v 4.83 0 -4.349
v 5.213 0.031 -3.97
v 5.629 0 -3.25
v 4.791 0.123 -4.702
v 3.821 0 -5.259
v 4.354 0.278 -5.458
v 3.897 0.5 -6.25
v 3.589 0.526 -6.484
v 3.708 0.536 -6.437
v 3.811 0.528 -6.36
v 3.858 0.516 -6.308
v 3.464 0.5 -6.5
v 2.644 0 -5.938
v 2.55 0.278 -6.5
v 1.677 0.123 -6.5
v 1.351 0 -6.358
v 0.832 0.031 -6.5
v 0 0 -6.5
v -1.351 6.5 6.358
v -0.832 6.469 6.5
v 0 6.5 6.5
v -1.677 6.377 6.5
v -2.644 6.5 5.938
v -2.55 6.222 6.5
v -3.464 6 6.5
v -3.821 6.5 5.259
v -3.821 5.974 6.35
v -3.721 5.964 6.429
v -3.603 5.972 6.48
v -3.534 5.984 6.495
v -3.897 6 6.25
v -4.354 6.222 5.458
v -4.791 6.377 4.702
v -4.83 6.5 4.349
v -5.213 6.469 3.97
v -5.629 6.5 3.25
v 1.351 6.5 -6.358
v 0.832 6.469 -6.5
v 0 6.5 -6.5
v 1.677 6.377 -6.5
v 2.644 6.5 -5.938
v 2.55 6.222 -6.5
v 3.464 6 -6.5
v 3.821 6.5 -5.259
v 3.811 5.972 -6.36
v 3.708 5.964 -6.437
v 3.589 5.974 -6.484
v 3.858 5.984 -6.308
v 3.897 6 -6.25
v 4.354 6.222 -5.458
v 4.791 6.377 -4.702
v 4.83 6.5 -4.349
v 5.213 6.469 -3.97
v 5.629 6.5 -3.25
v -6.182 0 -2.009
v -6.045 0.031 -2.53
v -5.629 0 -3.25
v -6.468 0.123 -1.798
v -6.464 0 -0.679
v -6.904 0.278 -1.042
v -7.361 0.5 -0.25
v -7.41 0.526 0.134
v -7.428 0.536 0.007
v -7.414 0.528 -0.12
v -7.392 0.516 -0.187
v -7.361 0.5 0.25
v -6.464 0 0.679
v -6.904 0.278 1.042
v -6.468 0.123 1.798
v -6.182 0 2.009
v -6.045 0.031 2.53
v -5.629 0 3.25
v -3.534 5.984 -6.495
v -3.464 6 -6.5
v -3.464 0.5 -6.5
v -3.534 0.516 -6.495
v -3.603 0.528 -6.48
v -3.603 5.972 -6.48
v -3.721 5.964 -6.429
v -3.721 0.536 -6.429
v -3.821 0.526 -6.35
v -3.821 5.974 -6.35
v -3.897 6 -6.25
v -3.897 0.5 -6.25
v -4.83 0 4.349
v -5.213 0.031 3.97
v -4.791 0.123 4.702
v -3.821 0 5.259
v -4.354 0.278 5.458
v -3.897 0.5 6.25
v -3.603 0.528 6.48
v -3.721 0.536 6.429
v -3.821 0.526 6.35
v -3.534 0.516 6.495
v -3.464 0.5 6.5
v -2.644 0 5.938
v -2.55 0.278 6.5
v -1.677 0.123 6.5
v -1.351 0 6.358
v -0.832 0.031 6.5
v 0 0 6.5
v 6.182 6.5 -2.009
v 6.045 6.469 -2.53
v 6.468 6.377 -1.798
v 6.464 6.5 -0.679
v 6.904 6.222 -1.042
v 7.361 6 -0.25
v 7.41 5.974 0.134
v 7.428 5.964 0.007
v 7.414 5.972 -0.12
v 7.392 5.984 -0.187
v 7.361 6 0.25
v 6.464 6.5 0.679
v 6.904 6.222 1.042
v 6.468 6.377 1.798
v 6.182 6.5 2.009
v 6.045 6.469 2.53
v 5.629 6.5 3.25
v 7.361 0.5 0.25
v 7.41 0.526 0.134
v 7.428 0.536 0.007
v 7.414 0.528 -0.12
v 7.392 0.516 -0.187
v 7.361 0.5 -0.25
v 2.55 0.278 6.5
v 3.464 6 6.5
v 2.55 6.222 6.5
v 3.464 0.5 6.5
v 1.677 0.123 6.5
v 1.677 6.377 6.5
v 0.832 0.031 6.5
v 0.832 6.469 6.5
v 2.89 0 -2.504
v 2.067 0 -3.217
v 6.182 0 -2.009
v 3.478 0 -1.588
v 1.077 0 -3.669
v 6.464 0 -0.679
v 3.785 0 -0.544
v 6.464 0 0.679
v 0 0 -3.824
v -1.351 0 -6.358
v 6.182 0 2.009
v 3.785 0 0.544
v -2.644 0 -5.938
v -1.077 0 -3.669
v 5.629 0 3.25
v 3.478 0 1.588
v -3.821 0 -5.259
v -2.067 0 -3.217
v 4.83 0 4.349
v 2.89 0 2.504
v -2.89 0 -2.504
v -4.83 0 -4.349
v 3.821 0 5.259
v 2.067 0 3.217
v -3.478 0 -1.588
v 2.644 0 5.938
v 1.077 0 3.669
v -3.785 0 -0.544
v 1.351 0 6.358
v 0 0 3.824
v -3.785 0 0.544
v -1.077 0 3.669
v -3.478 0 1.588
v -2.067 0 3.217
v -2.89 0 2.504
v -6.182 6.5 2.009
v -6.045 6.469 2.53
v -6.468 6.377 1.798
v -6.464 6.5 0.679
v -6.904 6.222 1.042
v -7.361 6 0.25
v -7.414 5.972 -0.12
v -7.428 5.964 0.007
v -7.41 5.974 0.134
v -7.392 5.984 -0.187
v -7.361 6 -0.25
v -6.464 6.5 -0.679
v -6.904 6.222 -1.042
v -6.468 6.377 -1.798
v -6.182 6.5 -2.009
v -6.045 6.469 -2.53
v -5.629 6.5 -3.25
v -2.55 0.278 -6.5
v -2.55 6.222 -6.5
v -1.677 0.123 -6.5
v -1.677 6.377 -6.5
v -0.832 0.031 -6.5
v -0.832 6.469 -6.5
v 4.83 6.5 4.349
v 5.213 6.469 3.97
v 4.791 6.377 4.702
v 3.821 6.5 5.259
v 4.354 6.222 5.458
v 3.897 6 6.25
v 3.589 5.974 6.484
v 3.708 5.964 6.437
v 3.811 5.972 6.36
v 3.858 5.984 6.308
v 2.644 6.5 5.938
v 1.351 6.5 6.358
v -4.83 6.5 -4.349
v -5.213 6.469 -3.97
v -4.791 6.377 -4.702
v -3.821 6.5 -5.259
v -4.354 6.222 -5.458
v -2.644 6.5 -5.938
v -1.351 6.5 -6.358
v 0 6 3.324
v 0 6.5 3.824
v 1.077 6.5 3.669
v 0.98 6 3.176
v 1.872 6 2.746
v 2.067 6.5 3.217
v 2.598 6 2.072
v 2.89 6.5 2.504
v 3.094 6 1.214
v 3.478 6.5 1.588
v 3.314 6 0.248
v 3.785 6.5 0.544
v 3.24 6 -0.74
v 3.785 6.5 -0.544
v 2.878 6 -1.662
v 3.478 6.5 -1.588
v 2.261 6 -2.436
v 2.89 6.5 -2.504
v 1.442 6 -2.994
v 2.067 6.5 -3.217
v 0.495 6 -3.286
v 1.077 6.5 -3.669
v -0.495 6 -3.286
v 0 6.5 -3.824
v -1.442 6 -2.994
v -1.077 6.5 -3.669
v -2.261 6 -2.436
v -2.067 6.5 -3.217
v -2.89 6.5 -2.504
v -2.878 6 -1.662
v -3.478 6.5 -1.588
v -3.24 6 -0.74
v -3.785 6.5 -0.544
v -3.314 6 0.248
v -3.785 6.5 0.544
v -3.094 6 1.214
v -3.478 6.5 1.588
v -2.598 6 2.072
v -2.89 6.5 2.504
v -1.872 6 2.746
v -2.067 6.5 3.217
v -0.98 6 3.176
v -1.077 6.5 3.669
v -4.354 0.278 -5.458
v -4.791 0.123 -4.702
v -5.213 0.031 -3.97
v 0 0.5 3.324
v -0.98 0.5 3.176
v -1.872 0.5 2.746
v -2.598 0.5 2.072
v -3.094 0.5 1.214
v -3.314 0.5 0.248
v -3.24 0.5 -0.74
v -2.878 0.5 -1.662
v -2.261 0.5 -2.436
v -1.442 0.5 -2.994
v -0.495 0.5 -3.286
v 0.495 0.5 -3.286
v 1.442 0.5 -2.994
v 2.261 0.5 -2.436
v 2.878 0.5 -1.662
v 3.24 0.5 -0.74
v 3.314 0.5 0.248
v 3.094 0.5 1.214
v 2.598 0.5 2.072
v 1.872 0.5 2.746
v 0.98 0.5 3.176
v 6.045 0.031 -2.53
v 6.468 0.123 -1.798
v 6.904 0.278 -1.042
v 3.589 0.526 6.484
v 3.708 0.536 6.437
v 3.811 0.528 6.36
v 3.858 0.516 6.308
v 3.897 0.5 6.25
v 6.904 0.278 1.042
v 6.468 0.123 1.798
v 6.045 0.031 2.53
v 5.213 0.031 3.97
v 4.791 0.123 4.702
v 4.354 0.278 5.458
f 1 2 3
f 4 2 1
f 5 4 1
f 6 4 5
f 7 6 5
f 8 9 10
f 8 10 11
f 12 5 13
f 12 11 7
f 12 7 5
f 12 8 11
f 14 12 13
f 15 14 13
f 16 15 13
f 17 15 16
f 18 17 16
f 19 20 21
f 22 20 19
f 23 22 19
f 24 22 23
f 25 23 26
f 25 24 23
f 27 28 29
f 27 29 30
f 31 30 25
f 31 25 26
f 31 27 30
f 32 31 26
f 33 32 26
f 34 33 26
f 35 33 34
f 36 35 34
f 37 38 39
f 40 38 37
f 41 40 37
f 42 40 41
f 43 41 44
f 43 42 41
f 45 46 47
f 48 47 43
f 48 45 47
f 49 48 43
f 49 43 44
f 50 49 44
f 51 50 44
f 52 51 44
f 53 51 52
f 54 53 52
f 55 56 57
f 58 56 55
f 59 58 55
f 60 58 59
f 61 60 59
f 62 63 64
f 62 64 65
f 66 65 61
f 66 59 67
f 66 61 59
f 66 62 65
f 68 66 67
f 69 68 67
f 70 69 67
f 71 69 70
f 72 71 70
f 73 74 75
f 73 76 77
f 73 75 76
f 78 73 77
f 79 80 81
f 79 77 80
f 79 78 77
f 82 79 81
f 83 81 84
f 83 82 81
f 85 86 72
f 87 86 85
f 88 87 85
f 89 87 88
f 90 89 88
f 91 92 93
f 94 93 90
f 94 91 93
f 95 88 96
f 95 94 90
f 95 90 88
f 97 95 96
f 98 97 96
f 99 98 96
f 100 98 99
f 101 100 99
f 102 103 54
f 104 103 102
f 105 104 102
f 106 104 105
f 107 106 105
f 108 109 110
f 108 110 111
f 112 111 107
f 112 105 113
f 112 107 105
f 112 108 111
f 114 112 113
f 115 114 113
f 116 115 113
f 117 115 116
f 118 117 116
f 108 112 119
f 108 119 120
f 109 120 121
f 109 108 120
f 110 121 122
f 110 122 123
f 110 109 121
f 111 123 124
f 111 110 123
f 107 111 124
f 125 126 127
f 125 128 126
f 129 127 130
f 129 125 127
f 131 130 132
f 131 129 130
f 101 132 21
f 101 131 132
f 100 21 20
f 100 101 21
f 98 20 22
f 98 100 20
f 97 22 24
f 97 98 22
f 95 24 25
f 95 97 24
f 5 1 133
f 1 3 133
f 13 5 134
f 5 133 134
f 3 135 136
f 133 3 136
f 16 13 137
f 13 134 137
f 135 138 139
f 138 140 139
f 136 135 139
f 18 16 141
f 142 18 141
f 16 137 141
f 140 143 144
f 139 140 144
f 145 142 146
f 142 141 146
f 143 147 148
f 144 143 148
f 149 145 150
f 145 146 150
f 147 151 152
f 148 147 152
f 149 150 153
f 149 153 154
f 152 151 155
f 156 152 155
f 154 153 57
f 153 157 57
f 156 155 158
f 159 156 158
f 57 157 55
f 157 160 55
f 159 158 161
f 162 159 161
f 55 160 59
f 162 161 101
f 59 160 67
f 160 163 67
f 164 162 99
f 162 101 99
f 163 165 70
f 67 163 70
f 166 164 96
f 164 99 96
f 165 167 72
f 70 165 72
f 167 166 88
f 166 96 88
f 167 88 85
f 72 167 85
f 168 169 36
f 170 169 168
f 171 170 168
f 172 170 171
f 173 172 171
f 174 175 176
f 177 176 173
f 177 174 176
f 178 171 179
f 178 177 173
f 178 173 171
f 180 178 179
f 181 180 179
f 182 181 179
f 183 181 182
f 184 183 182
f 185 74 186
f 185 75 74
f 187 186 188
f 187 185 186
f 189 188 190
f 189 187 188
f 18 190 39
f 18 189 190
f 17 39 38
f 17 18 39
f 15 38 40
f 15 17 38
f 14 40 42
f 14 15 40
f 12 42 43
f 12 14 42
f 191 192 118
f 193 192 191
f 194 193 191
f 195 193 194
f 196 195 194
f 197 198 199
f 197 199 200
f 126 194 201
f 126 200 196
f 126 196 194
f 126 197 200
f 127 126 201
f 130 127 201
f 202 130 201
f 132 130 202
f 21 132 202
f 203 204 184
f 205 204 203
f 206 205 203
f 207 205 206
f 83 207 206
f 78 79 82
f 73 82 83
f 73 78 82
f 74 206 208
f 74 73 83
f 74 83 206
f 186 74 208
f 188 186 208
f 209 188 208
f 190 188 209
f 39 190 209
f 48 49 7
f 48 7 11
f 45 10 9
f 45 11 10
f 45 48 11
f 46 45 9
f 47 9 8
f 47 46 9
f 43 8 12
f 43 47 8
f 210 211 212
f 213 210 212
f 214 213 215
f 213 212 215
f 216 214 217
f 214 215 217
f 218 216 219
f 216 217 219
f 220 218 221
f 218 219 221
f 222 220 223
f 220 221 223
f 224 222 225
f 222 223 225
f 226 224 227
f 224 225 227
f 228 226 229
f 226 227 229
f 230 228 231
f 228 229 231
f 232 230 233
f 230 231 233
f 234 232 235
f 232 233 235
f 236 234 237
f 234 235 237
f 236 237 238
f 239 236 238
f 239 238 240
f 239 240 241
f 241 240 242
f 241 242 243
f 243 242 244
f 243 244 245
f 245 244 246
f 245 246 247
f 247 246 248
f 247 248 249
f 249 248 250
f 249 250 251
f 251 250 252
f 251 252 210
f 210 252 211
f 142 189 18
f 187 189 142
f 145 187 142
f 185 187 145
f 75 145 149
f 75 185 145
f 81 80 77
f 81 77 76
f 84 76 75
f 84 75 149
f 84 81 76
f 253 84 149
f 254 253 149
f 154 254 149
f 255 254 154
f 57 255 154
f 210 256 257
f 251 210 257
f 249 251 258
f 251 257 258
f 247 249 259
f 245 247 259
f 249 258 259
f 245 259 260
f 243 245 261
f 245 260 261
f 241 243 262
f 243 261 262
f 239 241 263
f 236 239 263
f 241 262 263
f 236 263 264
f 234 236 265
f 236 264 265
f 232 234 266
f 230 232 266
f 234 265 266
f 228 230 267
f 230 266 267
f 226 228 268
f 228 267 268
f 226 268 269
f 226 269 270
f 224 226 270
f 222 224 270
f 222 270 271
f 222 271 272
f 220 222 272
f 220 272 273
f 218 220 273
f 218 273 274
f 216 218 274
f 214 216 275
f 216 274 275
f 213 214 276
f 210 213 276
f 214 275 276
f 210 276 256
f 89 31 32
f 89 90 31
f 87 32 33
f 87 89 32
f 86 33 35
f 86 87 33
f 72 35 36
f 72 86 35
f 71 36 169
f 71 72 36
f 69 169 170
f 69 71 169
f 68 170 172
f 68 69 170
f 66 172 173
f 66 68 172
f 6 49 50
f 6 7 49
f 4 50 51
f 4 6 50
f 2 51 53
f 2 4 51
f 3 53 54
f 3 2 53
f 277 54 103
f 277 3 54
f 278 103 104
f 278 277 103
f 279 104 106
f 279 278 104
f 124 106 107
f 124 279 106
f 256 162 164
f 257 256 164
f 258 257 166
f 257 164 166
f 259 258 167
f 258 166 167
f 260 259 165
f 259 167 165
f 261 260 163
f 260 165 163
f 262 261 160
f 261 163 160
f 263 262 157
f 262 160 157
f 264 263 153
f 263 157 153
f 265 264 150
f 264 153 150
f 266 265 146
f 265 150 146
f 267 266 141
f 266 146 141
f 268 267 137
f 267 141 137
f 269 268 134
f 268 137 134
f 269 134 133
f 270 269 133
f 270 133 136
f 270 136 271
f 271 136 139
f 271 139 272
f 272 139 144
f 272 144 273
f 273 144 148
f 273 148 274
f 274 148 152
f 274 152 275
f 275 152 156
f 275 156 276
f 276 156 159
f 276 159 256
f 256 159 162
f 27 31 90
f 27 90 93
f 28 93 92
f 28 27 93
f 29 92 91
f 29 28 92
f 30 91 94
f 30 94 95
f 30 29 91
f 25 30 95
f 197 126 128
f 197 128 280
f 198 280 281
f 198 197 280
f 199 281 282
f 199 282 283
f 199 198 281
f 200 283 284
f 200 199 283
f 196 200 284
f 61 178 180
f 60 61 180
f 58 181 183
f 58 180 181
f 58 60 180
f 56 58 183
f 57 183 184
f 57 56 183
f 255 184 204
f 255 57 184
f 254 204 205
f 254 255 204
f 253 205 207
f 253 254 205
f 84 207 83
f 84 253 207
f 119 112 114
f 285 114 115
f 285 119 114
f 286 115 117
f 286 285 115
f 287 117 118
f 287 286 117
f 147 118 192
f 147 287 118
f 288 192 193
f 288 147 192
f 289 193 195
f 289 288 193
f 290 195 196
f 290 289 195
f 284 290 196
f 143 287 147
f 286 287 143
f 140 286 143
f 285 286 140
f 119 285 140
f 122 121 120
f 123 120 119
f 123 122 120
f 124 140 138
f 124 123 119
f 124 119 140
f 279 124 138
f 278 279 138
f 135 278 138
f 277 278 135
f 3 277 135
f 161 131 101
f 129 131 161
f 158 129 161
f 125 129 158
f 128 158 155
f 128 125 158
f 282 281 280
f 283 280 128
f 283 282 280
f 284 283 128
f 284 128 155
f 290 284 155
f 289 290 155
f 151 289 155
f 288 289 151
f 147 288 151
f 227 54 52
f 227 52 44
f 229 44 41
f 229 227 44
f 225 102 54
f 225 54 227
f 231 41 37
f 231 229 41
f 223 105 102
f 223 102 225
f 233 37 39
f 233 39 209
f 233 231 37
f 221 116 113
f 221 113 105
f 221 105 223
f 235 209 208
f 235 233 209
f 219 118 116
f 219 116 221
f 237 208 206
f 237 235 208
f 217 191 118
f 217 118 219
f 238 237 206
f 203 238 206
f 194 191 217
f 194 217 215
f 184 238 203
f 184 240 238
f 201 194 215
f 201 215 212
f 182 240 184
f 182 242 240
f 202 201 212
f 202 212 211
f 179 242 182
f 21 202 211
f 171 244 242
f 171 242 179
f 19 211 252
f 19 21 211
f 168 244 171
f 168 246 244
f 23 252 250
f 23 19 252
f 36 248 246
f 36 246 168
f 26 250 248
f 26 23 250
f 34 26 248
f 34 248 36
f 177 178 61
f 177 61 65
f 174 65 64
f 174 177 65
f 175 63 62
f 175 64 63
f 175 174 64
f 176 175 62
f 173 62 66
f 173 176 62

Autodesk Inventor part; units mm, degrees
ref_plane "YZ Plane" through (0, 0, 0) normal (1, 0, 0) x (0, 1, 0)
ref_plane "XZ Plane" through (0, 0, 0) normal (0, 1, 0) x (-1, 0, 0)
ref_plane "XY Plane" through (0, 0, 0) normal (0, 0, 1) x (1, 0, 0)
sketch "Sketch1" plane through (0, 0, 0) normal (0, 1, 0) x (-1, 0, 0)
  line L0 (3.7528, 6.5) -> (7.5056, 0)
  line L1 (7.5056, 0) -> (3.7528, -6.5)
  line L2 (3.7528, -6.5) -> (-3.7528, -6.5)
  line L3 (-3.7528, -6.5) -> (-7.5056, 0)
  line L4 (-7.5056, 0) -> (-3.7528, 6.5)
  line L5 (-3.7528, 6.5) -> (3.7528, 6.5)
  point P0 (0, 0)
  point P1 (0, 0)
  dimension "d0" = 6.5
extrude "Extrusion1" add sketch "Sketch1" along normal blind 6.5
sketch "Sketch2" plane through (0, 6.5, 0) normal (0, 1, 0) x (1, 0, 0)
  point P0 (0, 0)
hole "Hole1" at (0, 6.5, 0) direction (0, -1, 0) diameter 6.647 depth 8 tip angle 118 thread size "M8x1.25" class "6H" standard "ISO Metric profile"
sketch "Sketch3" plane through (0, 6.5, 0) normal (0, 1, 0) x (1, 0, 0)
  circle A0 centre (0, 0) radius 3.3235 projected
  circle A1 centre (0, 0) radius 6.5
  circle A2 centre (0, 0) radius 29.8584
extrude "Extrusion2" cut sketch "Sketch3" against normal blind 1 draft -60 contours A2
sketch "Sketch4" plane through (0, 0, 0) normal (0, -1, 0) x (1, 0, 0)
  circle A0 centre (0, 0) radius 3.3235 projected
  circle A1 centre (0, 0) radius 6.5
  circle A2 centre (0, 0) radius 18
extrude "Extrusion3" cut sketch "Sketch4" against normal blind 1 draft -60 contours A2
fillet "Fillet1" radius 0.5 6 edges at (-7.5056, 3.25, 0) (-3.7528, 3.25, 6.5) (3.7528, 3.25, 6.5) (7.5056, 3.25, 0) (3.7528, 3.25, -6.5) (-3.7528, 3.25, -6.5)
chamfer "Chamfer1" distance 0.5 angle 45 2 edges at (0, 6.5, -3.3235) (0, 0, -3.3235)
properties part number "bed nut" material "Stainless Steel"
